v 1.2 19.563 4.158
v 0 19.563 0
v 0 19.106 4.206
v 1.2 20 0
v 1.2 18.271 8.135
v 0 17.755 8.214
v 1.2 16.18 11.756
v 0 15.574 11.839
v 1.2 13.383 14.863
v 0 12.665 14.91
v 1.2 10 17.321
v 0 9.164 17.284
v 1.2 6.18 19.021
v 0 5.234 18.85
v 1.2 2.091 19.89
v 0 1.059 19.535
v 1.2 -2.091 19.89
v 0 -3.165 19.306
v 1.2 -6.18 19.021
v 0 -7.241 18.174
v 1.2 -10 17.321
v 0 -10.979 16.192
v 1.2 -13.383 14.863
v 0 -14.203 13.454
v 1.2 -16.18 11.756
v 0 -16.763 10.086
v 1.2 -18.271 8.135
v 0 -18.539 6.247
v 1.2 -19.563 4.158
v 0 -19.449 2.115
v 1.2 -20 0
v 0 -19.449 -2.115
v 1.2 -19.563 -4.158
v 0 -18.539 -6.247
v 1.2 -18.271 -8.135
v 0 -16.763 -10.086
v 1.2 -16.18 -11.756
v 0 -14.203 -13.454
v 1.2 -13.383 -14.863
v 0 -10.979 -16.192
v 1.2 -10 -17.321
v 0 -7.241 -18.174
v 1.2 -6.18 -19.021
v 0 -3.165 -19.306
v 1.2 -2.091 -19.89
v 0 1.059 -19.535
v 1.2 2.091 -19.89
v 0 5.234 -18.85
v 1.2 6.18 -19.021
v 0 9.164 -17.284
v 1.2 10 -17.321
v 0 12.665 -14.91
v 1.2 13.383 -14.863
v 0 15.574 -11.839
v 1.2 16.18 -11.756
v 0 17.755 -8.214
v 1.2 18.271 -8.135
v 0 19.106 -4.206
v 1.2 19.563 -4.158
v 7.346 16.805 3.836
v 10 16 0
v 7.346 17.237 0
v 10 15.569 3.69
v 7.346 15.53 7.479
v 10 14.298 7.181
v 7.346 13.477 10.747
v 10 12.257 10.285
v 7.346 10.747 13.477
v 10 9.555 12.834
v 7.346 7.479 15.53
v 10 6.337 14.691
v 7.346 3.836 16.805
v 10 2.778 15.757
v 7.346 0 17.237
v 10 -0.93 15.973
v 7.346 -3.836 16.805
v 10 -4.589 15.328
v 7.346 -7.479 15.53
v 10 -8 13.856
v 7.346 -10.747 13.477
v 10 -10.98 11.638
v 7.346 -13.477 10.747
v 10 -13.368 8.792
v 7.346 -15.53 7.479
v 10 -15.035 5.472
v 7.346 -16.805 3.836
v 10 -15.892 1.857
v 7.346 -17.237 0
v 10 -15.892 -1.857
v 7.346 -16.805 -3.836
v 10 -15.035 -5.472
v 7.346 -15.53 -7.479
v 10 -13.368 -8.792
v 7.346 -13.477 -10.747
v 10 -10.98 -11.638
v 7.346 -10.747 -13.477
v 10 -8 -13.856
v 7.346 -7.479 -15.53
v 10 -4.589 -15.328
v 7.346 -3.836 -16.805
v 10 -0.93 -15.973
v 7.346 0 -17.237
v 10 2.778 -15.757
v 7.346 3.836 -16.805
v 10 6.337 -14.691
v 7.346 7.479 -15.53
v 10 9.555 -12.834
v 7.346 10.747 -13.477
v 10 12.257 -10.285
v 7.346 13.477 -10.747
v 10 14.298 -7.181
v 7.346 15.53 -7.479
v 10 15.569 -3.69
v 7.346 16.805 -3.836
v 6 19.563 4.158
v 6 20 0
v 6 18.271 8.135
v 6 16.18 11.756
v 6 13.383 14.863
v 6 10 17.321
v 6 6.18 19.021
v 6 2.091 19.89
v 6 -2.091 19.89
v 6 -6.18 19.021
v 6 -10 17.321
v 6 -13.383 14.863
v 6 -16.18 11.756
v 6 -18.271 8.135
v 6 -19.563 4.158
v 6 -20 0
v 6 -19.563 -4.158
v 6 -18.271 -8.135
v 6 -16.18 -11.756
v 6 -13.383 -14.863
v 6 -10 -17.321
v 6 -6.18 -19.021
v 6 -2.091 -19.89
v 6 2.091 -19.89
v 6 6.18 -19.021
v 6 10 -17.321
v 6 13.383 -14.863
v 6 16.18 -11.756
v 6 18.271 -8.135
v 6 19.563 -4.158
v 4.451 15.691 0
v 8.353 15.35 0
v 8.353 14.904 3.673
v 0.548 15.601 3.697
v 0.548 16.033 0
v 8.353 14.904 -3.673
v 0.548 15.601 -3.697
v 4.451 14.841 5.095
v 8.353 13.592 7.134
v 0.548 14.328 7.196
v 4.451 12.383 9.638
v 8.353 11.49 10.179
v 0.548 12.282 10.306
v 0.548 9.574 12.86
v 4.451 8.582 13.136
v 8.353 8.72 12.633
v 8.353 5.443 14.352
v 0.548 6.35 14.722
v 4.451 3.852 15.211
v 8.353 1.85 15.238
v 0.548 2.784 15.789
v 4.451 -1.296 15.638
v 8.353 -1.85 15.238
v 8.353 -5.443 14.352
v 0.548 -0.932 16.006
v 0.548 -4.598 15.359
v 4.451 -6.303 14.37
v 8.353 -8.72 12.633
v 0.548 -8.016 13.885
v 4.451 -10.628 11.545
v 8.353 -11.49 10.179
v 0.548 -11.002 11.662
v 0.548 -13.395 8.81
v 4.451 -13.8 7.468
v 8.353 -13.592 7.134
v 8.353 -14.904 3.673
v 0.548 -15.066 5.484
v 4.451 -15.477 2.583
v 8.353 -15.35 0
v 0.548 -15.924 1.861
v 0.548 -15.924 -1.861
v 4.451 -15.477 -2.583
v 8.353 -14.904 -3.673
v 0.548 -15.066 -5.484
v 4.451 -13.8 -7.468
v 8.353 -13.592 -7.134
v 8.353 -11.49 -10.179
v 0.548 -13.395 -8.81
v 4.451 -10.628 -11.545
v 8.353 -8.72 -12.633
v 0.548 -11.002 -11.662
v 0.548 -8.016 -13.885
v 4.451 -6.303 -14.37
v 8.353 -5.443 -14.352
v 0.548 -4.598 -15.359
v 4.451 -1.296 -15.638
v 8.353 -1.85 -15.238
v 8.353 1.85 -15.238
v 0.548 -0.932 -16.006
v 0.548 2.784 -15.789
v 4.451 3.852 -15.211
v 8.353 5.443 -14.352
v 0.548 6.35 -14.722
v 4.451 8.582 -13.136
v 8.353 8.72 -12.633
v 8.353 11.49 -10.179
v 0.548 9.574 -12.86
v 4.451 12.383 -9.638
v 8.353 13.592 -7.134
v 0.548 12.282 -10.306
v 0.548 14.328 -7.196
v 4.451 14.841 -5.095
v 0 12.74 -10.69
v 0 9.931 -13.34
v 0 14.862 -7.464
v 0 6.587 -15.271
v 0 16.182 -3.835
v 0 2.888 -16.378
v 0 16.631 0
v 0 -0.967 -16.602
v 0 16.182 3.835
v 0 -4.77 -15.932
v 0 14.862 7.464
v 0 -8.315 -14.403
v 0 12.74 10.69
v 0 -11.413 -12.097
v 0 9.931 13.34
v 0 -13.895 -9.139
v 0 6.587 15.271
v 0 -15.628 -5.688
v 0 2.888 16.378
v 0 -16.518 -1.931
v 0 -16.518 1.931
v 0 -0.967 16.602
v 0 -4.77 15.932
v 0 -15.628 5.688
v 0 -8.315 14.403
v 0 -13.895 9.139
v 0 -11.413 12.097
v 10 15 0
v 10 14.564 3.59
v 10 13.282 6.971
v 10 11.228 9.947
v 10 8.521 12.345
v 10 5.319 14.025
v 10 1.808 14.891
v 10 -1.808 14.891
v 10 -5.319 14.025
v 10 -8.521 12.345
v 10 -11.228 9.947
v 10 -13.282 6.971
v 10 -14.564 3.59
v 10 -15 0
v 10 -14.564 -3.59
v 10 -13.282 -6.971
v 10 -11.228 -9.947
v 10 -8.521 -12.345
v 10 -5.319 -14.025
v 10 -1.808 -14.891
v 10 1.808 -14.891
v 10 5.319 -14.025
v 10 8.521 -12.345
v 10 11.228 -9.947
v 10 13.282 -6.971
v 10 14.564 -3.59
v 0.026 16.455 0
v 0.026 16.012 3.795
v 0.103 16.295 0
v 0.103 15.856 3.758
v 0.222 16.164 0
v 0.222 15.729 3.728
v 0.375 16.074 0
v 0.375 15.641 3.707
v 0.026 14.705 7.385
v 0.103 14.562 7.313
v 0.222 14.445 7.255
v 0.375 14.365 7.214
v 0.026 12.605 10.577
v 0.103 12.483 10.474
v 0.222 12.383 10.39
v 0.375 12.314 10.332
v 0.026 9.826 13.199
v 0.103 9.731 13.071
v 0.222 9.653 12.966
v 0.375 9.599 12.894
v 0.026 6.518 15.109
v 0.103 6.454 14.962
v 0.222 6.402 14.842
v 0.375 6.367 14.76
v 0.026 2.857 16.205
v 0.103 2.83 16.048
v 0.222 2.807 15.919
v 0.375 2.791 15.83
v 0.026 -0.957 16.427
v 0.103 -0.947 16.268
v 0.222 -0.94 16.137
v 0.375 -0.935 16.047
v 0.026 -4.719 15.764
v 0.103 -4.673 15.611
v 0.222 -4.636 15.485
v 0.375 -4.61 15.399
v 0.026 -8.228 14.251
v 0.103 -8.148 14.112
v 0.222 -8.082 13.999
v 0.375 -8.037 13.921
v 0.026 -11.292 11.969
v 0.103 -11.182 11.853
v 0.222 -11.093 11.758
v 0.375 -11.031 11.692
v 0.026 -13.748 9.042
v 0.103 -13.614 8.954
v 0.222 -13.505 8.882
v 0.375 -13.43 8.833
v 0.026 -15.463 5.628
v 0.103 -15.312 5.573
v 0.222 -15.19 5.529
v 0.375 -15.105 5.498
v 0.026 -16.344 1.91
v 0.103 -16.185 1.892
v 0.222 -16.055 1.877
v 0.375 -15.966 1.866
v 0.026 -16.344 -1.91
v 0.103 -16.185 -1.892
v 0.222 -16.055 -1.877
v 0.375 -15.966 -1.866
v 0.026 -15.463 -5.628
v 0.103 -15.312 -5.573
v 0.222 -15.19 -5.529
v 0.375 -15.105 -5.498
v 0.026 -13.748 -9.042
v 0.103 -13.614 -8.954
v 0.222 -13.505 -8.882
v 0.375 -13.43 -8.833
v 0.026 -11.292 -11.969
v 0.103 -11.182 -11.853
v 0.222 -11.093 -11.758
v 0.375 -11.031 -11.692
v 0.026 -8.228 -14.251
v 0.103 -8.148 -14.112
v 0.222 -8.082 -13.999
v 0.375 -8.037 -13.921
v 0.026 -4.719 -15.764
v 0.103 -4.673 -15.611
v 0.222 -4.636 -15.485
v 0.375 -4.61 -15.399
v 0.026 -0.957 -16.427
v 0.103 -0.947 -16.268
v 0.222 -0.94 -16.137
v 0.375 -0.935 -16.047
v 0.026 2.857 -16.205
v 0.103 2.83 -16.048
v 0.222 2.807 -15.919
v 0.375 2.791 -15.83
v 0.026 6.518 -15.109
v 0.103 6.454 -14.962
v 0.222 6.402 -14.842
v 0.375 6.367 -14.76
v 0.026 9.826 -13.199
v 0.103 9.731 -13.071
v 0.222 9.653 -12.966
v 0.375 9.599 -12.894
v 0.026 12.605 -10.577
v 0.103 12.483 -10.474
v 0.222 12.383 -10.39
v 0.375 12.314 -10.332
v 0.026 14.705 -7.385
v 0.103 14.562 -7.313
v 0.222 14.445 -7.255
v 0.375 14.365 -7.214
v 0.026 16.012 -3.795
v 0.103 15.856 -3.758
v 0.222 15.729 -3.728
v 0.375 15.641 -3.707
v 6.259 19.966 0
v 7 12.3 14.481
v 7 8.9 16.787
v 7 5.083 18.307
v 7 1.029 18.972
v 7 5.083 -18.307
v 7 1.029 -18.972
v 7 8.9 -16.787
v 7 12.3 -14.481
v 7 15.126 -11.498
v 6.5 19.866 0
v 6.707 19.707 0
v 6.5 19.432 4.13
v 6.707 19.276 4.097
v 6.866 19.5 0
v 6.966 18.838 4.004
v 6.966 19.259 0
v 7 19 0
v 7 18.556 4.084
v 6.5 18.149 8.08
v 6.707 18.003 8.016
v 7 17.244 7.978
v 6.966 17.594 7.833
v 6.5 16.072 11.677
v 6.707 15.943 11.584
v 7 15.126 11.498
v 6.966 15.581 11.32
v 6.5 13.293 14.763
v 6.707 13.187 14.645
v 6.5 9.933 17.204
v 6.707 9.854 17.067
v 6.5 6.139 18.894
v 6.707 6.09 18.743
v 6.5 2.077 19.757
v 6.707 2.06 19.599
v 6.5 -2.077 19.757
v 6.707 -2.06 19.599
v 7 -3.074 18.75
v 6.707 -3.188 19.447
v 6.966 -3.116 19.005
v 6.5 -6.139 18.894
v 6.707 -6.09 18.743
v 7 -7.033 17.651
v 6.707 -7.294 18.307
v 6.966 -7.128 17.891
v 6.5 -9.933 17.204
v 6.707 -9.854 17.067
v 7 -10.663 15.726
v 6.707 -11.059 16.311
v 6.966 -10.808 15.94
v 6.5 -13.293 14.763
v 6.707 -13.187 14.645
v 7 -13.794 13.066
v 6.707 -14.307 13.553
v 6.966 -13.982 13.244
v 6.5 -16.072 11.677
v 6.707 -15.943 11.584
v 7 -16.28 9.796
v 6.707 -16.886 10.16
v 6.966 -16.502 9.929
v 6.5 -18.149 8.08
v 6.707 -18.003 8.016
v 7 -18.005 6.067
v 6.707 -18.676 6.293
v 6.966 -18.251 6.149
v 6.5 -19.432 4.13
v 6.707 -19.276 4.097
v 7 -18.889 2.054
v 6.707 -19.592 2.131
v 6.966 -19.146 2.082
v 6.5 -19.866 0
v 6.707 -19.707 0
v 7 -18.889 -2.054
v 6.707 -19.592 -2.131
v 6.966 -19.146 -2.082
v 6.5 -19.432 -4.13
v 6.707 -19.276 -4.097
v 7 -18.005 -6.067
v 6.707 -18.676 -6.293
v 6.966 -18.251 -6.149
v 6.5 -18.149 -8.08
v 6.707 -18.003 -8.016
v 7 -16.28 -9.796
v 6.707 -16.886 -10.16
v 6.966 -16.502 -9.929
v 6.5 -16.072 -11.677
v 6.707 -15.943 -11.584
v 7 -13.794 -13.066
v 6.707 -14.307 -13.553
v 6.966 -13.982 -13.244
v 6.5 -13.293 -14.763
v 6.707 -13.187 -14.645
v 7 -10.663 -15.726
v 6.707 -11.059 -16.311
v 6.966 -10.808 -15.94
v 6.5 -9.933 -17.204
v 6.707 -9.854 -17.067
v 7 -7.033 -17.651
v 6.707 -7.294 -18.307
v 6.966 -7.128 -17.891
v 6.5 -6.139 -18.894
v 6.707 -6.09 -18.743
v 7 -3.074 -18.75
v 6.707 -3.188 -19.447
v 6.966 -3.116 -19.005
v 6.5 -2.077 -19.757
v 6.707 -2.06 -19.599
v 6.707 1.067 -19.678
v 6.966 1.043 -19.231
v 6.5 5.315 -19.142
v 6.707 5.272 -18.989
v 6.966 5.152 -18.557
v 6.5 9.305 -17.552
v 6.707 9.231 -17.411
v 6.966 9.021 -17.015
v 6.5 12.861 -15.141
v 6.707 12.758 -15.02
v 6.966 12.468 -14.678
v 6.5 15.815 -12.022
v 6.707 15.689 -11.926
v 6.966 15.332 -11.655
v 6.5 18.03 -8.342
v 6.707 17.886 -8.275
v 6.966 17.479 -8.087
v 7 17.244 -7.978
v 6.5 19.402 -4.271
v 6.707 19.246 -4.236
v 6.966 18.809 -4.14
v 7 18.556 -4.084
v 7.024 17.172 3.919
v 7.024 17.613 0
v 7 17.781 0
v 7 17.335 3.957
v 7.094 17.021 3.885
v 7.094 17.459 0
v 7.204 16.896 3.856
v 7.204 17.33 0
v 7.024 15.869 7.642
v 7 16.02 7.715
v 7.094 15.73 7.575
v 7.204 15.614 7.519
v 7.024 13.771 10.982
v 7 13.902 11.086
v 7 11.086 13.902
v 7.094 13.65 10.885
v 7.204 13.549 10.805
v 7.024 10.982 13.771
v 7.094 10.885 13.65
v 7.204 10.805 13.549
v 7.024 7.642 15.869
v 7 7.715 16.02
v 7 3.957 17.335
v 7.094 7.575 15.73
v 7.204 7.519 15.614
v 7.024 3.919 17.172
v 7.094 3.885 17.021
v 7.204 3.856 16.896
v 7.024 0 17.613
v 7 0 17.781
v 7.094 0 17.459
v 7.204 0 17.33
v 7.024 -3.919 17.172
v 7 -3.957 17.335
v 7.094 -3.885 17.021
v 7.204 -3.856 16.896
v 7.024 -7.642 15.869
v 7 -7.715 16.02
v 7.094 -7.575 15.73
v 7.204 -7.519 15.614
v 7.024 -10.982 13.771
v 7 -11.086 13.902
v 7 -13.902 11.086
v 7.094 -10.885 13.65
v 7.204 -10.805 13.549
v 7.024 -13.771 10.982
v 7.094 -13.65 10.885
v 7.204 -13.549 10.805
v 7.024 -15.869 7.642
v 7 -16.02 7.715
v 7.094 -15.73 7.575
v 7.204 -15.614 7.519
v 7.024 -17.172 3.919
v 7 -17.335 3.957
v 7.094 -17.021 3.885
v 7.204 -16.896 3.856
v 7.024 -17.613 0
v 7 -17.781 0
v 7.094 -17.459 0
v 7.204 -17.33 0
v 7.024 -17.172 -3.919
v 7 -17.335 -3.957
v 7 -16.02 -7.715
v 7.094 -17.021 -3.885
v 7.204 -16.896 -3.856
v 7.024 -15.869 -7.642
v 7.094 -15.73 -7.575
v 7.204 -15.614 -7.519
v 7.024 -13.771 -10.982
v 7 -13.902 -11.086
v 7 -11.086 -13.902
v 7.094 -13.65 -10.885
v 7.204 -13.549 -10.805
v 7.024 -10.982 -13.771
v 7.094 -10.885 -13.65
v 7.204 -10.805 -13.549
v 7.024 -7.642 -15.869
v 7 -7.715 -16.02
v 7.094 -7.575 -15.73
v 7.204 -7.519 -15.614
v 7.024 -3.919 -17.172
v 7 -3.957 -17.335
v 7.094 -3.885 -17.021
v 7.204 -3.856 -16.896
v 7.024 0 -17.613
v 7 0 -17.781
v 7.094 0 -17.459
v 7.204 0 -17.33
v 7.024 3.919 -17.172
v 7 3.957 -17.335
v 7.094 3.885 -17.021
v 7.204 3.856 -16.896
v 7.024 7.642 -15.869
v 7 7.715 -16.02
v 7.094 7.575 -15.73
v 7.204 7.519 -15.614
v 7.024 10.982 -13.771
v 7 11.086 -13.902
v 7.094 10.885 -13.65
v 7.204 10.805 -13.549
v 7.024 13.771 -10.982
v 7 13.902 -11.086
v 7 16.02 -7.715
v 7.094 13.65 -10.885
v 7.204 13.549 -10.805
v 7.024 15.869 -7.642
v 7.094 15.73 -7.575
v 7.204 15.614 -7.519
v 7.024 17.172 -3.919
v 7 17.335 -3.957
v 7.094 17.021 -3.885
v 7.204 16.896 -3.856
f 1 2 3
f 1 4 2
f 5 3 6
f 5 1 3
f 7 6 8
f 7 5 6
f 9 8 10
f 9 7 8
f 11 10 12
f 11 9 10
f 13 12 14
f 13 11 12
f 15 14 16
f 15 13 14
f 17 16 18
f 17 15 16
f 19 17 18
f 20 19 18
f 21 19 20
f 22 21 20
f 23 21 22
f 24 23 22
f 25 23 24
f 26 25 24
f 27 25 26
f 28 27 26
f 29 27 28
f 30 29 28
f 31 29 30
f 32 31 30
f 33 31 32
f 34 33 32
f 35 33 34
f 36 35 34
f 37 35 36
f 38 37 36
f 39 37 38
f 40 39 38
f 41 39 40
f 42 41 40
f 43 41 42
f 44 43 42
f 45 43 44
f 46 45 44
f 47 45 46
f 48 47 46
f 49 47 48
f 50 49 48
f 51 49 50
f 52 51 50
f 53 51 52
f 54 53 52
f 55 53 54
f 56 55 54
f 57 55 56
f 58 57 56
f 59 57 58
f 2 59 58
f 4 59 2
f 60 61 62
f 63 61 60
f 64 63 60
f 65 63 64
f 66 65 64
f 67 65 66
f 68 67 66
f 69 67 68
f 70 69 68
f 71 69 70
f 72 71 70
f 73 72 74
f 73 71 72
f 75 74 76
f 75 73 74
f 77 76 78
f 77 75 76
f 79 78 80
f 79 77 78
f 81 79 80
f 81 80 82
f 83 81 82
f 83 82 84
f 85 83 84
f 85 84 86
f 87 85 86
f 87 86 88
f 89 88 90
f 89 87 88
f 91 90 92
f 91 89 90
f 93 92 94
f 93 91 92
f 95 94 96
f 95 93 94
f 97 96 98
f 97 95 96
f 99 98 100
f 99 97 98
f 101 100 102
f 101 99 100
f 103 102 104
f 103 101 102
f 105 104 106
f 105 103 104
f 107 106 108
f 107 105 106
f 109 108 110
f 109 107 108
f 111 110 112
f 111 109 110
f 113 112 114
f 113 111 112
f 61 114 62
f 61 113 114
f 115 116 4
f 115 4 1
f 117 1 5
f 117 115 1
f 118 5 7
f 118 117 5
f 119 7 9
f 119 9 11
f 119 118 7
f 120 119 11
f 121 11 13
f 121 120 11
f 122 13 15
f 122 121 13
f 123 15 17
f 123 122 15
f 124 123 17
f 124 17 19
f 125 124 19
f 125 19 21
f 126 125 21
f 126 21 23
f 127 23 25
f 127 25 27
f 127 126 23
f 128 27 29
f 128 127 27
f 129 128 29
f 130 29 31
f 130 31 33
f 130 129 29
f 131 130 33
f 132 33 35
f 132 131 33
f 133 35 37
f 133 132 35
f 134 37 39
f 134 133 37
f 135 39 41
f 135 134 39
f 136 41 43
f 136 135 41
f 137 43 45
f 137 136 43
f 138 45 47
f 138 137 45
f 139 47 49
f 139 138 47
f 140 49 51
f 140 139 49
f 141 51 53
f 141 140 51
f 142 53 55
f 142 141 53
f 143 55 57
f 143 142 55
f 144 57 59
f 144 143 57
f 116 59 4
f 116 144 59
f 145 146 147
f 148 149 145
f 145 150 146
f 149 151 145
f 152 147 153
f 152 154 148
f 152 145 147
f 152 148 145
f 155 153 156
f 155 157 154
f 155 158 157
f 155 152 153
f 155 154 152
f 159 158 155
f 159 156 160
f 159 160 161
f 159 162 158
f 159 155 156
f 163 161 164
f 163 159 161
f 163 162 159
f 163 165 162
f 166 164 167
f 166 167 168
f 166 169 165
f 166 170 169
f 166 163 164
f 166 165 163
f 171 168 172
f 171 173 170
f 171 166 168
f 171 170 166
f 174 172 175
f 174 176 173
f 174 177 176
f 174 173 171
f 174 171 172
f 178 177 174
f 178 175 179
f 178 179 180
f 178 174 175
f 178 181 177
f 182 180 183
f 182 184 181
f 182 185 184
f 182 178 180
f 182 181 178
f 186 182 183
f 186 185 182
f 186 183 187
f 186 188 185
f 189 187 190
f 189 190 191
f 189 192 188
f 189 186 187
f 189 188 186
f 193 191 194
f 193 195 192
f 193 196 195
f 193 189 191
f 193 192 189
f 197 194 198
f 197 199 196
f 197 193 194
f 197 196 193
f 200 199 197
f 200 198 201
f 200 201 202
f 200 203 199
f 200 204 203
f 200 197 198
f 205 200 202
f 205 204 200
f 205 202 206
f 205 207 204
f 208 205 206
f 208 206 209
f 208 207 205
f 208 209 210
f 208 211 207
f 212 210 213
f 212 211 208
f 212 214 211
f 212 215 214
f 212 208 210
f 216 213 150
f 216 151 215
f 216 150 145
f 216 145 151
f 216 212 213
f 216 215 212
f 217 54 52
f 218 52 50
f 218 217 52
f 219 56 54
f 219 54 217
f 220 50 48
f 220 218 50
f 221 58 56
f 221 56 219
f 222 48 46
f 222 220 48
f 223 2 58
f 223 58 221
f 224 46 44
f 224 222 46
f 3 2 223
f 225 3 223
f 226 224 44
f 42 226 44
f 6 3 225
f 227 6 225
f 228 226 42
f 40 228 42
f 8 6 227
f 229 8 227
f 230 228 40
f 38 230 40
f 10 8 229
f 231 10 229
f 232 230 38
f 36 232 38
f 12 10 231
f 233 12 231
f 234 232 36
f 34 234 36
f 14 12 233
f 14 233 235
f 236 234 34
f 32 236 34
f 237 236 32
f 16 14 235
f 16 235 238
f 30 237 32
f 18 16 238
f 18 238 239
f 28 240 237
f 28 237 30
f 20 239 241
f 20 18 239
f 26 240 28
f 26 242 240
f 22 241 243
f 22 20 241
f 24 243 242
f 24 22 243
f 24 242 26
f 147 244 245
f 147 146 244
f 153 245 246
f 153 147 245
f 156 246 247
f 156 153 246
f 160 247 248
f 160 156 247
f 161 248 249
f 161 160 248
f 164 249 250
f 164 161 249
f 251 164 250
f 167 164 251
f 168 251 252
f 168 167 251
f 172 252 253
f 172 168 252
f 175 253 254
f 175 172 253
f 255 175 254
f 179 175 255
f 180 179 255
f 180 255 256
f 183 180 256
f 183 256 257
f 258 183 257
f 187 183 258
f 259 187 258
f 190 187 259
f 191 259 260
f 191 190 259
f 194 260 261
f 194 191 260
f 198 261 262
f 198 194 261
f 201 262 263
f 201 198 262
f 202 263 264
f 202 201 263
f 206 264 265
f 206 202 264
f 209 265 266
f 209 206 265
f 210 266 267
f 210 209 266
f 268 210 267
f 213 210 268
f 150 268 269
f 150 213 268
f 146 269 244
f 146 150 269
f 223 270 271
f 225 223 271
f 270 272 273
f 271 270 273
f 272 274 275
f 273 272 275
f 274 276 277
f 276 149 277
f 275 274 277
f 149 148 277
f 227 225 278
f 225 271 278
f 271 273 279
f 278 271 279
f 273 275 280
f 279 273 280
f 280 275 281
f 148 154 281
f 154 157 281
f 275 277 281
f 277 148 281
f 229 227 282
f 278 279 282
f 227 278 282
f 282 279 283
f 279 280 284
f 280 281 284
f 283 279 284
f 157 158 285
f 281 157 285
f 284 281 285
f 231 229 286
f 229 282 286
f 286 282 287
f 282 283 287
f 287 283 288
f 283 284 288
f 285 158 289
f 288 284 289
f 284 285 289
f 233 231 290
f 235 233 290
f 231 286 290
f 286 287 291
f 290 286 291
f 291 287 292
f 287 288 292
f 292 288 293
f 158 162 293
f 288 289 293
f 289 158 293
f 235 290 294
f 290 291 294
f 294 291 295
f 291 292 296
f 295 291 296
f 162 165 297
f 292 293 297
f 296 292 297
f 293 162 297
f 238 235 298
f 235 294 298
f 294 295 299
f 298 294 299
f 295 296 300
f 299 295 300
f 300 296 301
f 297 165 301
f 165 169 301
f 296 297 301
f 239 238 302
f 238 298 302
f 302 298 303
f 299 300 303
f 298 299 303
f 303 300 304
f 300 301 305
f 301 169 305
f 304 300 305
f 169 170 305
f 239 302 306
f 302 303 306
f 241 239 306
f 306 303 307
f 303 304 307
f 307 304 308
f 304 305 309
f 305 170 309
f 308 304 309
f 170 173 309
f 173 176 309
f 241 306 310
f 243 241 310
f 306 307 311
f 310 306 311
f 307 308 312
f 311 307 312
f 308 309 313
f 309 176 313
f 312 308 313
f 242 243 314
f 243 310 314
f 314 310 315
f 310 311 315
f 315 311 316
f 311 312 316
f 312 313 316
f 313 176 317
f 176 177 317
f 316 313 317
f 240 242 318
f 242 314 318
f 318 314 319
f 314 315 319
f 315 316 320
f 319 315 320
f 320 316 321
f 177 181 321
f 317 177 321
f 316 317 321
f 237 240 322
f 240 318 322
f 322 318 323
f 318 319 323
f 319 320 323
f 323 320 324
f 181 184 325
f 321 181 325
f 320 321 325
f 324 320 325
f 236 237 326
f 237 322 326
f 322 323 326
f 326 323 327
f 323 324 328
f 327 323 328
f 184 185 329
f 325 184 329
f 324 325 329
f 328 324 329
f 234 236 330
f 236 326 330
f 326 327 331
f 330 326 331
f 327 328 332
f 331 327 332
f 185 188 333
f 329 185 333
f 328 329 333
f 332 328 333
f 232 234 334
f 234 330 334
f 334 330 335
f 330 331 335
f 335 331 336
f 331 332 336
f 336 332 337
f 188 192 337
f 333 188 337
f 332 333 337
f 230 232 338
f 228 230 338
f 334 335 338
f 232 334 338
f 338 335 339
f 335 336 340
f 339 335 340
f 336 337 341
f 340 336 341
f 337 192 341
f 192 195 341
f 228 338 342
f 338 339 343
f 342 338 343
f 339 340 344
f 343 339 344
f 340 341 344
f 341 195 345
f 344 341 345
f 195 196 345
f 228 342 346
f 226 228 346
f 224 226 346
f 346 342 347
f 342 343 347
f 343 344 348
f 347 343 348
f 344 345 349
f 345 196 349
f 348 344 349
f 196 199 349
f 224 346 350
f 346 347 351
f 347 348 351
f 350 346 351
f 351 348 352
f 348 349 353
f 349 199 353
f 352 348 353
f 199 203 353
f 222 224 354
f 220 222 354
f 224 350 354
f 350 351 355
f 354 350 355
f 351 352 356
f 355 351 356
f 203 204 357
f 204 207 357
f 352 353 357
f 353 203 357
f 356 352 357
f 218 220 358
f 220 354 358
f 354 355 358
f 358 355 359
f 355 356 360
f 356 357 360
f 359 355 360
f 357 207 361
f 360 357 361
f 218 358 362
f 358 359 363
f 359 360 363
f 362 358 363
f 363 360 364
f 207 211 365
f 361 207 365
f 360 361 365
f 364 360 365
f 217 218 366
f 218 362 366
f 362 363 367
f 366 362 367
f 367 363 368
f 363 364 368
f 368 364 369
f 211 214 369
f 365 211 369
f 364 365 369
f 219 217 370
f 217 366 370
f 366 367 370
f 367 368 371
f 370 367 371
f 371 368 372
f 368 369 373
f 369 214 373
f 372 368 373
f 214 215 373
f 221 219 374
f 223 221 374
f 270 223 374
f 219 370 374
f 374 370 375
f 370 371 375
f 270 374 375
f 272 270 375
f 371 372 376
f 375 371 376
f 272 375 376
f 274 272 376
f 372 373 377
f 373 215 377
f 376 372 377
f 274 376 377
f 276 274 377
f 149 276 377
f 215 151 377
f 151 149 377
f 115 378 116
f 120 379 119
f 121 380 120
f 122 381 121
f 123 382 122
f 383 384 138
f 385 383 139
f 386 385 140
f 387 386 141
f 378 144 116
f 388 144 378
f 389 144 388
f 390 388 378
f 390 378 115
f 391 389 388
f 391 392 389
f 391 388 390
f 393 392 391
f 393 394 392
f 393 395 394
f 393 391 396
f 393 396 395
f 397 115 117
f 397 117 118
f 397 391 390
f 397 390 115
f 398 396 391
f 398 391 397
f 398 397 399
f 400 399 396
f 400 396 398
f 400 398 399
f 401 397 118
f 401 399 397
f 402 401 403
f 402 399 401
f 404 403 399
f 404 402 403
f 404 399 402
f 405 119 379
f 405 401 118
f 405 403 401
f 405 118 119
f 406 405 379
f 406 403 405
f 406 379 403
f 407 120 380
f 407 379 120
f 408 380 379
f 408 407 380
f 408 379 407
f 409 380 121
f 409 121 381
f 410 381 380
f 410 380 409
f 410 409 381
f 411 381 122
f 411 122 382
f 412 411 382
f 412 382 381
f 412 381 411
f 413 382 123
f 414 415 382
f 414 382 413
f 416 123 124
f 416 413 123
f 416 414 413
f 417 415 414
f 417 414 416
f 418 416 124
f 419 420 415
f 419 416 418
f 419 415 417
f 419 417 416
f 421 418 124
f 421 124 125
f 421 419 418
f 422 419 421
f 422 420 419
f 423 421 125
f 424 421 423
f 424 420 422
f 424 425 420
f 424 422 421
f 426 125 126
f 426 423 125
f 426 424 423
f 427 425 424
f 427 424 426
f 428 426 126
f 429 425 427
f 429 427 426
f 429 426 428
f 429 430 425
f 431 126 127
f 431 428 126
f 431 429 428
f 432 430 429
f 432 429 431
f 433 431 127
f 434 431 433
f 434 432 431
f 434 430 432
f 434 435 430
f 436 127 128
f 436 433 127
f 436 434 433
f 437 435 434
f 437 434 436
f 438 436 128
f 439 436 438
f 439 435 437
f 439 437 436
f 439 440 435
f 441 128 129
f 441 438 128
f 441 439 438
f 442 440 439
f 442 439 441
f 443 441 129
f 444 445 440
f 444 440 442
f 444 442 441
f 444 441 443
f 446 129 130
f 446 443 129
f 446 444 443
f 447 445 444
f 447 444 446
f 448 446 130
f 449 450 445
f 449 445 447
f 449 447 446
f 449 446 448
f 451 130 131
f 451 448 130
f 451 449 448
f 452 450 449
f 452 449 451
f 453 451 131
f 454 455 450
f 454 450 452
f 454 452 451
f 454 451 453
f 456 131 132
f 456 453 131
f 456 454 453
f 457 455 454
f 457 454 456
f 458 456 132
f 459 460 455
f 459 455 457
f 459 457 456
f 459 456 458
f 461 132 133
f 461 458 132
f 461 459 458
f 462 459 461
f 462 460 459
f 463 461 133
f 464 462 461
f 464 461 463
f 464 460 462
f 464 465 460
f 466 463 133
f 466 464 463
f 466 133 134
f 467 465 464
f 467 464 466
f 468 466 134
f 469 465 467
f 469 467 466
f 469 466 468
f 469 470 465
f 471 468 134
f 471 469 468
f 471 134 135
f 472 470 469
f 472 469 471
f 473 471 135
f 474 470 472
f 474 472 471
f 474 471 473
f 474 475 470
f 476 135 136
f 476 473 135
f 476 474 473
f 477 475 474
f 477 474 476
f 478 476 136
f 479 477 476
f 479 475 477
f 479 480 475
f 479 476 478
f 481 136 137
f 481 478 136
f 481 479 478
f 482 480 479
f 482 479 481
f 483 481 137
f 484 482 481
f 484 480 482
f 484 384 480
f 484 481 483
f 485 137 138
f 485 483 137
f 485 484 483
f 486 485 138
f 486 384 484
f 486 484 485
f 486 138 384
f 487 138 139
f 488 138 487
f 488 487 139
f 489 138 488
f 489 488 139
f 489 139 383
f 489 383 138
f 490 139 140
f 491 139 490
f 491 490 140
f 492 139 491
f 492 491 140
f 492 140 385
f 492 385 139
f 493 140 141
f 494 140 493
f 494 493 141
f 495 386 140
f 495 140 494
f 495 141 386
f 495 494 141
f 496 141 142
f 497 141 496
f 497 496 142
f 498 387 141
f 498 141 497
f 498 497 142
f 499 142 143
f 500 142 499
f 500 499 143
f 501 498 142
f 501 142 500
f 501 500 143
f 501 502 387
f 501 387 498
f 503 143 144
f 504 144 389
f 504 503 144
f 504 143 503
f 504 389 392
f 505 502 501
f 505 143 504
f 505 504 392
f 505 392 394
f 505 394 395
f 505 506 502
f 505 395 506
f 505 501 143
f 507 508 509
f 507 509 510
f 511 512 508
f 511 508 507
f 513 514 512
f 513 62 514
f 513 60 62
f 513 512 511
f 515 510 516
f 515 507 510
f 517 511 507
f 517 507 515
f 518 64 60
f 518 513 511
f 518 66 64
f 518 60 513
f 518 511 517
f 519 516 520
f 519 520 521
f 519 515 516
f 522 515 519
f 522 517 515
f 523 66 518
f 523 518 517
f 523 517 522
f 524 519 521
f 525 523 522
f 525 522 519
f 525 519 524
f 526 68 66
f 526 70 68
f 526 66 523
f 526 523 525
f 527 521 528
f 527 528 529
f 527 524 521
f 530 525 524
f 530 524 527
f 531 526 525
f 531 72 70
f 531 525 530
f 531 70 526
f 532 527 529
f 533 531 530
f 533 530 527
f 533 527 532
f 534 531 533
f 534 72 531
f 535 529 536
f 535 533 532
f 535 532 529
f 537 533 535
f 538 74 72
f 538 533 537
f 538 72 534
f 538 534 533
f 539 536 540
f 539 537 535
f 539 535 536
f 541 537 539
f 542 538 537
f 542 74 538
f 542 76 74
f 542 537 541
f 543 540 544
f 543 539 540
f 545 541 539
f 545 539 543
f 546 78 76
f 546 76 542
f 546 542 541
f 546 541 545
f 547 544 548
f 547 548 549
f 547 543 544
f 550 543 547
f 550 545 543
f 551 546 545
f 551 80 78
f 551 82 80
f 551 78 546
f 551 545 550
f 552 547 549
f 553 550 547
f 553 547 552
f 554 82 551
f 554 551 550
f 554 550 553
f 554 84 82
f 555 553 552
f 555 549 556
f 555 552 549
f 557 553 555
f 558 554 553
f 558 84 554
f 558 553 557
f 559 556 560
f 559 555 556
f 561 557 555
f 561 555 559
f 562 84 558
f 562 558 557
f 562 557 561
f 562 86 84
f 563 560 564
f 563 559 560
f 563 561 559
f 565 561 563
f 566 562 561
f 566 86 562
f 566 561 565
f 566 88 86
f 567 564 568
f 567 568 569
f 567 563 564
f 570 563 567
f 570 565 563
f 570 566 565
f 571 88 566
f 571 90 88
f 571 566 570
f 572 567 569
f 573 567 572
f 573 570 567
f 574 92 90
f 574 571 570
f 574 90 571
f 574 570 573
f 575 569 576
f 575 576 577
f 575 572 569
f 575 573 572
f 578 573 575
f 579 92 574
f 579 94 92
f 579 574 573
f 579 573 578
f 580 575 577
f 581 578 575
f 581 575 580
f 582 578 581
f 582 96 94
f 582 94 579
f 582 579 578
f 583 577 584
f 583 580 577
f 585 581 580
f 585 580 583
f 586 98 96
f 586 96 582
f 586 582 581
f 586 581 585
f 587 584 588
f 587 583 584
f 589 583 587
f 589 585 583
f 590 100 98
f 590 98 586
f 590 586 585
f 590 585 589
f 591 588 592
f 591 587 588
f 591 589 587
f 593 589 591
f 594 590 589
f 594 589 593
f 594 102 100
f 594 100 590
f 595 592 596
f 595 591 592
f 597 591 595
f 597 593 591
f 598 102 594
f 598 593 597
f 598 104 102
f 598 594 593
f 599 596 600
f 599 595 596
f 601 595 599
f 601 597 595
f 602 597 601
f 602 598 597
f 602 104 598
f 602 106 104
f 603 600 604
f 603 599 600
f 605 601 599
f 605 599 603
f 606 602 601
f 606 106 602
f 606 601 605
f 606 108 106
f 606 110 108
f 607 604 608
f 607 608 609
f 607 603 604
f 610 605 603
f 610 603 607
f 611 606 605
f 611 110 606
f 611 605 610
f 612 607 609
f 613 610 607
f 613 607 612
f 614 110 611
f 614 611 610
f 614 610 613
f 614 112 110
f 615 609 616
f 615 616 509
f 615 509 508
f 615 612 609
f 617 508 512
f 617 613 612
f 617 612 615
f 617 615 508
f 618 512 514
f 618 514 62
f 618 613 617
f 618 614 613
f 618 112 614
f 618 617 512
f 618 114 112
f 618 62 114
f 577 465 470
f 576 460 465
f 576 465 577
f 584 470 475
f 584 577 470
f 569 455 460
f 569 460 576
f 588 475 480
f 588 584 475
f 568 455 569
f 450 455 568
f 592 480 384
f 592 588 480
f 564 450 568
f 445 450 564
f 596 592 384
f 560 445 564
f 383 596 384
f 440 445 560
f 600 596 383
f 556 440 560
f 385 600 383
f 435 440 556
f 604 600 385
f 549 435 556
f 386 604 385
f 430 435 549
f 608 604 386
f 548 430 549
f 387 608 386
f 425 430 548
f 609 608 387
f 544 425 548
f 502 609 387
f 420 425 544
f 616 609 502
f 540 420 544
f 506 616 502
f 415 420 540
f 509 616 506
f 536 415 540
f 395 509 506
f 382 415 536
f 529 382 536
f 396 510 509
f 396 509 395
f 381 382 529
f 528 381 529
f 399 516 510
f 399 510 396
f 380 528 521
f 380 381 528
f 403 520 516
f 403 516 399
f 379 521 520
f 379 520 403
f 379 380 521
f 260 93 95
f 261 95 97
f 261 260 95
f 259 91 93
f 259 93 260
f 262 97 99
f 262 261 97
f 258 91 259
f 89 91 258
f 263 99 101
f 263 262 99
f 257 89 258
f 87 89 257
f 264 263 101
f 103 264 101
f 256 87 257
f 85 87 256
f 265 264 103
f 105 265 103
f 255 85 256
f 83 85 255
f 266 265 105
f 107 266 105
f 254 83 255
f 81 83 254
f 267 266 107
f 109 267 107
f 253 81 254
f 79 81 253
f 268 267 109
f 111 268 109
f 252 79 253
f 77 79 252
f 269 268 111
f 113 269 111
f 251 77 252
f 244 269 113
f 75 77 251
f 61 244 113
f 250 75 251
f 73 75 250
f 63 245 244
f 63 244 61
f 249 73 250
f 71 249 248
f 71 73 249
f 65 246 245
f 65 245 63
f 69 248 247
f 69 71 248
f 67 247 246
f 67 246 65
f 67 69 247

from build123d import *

# Parameters (mm, degrees)
FILLET1_R = 0.6
FILLET2_R = 1


with BuildPart() as part:
    # Sketch1 → Revolve1 (revolve)
    with BuildSketch(Plane.XY):
        Polygon((0, 16.080825938), (0, 19.563235604), (1.2, 19.999999886), (7, 19.999999886), (7, 17.398922974), (10, 16), (10, 15), (8.35338, 15.349999886), align=None)
    revolve(axis=Axis((0, 0, 0), (1, 0, 0)))

    # Fillet1
    fillet1_edges = [part.edges().sort_by_distance(p)[0] for p in [
        (0, -16.080825938, 0),
        (7, -17.398922974, 0),
    ]]
    fillet(fillet1_edges, radius=FILLET1_R)

    # Fillet2
    fillet2_edges = [part.edges().sort_by_distance(p)[0] for p in [
        (7, -19.999999886, 0),
    ]]
    fillet(fillet2_edges, radius=FILLET2_R)


solid = part.part
